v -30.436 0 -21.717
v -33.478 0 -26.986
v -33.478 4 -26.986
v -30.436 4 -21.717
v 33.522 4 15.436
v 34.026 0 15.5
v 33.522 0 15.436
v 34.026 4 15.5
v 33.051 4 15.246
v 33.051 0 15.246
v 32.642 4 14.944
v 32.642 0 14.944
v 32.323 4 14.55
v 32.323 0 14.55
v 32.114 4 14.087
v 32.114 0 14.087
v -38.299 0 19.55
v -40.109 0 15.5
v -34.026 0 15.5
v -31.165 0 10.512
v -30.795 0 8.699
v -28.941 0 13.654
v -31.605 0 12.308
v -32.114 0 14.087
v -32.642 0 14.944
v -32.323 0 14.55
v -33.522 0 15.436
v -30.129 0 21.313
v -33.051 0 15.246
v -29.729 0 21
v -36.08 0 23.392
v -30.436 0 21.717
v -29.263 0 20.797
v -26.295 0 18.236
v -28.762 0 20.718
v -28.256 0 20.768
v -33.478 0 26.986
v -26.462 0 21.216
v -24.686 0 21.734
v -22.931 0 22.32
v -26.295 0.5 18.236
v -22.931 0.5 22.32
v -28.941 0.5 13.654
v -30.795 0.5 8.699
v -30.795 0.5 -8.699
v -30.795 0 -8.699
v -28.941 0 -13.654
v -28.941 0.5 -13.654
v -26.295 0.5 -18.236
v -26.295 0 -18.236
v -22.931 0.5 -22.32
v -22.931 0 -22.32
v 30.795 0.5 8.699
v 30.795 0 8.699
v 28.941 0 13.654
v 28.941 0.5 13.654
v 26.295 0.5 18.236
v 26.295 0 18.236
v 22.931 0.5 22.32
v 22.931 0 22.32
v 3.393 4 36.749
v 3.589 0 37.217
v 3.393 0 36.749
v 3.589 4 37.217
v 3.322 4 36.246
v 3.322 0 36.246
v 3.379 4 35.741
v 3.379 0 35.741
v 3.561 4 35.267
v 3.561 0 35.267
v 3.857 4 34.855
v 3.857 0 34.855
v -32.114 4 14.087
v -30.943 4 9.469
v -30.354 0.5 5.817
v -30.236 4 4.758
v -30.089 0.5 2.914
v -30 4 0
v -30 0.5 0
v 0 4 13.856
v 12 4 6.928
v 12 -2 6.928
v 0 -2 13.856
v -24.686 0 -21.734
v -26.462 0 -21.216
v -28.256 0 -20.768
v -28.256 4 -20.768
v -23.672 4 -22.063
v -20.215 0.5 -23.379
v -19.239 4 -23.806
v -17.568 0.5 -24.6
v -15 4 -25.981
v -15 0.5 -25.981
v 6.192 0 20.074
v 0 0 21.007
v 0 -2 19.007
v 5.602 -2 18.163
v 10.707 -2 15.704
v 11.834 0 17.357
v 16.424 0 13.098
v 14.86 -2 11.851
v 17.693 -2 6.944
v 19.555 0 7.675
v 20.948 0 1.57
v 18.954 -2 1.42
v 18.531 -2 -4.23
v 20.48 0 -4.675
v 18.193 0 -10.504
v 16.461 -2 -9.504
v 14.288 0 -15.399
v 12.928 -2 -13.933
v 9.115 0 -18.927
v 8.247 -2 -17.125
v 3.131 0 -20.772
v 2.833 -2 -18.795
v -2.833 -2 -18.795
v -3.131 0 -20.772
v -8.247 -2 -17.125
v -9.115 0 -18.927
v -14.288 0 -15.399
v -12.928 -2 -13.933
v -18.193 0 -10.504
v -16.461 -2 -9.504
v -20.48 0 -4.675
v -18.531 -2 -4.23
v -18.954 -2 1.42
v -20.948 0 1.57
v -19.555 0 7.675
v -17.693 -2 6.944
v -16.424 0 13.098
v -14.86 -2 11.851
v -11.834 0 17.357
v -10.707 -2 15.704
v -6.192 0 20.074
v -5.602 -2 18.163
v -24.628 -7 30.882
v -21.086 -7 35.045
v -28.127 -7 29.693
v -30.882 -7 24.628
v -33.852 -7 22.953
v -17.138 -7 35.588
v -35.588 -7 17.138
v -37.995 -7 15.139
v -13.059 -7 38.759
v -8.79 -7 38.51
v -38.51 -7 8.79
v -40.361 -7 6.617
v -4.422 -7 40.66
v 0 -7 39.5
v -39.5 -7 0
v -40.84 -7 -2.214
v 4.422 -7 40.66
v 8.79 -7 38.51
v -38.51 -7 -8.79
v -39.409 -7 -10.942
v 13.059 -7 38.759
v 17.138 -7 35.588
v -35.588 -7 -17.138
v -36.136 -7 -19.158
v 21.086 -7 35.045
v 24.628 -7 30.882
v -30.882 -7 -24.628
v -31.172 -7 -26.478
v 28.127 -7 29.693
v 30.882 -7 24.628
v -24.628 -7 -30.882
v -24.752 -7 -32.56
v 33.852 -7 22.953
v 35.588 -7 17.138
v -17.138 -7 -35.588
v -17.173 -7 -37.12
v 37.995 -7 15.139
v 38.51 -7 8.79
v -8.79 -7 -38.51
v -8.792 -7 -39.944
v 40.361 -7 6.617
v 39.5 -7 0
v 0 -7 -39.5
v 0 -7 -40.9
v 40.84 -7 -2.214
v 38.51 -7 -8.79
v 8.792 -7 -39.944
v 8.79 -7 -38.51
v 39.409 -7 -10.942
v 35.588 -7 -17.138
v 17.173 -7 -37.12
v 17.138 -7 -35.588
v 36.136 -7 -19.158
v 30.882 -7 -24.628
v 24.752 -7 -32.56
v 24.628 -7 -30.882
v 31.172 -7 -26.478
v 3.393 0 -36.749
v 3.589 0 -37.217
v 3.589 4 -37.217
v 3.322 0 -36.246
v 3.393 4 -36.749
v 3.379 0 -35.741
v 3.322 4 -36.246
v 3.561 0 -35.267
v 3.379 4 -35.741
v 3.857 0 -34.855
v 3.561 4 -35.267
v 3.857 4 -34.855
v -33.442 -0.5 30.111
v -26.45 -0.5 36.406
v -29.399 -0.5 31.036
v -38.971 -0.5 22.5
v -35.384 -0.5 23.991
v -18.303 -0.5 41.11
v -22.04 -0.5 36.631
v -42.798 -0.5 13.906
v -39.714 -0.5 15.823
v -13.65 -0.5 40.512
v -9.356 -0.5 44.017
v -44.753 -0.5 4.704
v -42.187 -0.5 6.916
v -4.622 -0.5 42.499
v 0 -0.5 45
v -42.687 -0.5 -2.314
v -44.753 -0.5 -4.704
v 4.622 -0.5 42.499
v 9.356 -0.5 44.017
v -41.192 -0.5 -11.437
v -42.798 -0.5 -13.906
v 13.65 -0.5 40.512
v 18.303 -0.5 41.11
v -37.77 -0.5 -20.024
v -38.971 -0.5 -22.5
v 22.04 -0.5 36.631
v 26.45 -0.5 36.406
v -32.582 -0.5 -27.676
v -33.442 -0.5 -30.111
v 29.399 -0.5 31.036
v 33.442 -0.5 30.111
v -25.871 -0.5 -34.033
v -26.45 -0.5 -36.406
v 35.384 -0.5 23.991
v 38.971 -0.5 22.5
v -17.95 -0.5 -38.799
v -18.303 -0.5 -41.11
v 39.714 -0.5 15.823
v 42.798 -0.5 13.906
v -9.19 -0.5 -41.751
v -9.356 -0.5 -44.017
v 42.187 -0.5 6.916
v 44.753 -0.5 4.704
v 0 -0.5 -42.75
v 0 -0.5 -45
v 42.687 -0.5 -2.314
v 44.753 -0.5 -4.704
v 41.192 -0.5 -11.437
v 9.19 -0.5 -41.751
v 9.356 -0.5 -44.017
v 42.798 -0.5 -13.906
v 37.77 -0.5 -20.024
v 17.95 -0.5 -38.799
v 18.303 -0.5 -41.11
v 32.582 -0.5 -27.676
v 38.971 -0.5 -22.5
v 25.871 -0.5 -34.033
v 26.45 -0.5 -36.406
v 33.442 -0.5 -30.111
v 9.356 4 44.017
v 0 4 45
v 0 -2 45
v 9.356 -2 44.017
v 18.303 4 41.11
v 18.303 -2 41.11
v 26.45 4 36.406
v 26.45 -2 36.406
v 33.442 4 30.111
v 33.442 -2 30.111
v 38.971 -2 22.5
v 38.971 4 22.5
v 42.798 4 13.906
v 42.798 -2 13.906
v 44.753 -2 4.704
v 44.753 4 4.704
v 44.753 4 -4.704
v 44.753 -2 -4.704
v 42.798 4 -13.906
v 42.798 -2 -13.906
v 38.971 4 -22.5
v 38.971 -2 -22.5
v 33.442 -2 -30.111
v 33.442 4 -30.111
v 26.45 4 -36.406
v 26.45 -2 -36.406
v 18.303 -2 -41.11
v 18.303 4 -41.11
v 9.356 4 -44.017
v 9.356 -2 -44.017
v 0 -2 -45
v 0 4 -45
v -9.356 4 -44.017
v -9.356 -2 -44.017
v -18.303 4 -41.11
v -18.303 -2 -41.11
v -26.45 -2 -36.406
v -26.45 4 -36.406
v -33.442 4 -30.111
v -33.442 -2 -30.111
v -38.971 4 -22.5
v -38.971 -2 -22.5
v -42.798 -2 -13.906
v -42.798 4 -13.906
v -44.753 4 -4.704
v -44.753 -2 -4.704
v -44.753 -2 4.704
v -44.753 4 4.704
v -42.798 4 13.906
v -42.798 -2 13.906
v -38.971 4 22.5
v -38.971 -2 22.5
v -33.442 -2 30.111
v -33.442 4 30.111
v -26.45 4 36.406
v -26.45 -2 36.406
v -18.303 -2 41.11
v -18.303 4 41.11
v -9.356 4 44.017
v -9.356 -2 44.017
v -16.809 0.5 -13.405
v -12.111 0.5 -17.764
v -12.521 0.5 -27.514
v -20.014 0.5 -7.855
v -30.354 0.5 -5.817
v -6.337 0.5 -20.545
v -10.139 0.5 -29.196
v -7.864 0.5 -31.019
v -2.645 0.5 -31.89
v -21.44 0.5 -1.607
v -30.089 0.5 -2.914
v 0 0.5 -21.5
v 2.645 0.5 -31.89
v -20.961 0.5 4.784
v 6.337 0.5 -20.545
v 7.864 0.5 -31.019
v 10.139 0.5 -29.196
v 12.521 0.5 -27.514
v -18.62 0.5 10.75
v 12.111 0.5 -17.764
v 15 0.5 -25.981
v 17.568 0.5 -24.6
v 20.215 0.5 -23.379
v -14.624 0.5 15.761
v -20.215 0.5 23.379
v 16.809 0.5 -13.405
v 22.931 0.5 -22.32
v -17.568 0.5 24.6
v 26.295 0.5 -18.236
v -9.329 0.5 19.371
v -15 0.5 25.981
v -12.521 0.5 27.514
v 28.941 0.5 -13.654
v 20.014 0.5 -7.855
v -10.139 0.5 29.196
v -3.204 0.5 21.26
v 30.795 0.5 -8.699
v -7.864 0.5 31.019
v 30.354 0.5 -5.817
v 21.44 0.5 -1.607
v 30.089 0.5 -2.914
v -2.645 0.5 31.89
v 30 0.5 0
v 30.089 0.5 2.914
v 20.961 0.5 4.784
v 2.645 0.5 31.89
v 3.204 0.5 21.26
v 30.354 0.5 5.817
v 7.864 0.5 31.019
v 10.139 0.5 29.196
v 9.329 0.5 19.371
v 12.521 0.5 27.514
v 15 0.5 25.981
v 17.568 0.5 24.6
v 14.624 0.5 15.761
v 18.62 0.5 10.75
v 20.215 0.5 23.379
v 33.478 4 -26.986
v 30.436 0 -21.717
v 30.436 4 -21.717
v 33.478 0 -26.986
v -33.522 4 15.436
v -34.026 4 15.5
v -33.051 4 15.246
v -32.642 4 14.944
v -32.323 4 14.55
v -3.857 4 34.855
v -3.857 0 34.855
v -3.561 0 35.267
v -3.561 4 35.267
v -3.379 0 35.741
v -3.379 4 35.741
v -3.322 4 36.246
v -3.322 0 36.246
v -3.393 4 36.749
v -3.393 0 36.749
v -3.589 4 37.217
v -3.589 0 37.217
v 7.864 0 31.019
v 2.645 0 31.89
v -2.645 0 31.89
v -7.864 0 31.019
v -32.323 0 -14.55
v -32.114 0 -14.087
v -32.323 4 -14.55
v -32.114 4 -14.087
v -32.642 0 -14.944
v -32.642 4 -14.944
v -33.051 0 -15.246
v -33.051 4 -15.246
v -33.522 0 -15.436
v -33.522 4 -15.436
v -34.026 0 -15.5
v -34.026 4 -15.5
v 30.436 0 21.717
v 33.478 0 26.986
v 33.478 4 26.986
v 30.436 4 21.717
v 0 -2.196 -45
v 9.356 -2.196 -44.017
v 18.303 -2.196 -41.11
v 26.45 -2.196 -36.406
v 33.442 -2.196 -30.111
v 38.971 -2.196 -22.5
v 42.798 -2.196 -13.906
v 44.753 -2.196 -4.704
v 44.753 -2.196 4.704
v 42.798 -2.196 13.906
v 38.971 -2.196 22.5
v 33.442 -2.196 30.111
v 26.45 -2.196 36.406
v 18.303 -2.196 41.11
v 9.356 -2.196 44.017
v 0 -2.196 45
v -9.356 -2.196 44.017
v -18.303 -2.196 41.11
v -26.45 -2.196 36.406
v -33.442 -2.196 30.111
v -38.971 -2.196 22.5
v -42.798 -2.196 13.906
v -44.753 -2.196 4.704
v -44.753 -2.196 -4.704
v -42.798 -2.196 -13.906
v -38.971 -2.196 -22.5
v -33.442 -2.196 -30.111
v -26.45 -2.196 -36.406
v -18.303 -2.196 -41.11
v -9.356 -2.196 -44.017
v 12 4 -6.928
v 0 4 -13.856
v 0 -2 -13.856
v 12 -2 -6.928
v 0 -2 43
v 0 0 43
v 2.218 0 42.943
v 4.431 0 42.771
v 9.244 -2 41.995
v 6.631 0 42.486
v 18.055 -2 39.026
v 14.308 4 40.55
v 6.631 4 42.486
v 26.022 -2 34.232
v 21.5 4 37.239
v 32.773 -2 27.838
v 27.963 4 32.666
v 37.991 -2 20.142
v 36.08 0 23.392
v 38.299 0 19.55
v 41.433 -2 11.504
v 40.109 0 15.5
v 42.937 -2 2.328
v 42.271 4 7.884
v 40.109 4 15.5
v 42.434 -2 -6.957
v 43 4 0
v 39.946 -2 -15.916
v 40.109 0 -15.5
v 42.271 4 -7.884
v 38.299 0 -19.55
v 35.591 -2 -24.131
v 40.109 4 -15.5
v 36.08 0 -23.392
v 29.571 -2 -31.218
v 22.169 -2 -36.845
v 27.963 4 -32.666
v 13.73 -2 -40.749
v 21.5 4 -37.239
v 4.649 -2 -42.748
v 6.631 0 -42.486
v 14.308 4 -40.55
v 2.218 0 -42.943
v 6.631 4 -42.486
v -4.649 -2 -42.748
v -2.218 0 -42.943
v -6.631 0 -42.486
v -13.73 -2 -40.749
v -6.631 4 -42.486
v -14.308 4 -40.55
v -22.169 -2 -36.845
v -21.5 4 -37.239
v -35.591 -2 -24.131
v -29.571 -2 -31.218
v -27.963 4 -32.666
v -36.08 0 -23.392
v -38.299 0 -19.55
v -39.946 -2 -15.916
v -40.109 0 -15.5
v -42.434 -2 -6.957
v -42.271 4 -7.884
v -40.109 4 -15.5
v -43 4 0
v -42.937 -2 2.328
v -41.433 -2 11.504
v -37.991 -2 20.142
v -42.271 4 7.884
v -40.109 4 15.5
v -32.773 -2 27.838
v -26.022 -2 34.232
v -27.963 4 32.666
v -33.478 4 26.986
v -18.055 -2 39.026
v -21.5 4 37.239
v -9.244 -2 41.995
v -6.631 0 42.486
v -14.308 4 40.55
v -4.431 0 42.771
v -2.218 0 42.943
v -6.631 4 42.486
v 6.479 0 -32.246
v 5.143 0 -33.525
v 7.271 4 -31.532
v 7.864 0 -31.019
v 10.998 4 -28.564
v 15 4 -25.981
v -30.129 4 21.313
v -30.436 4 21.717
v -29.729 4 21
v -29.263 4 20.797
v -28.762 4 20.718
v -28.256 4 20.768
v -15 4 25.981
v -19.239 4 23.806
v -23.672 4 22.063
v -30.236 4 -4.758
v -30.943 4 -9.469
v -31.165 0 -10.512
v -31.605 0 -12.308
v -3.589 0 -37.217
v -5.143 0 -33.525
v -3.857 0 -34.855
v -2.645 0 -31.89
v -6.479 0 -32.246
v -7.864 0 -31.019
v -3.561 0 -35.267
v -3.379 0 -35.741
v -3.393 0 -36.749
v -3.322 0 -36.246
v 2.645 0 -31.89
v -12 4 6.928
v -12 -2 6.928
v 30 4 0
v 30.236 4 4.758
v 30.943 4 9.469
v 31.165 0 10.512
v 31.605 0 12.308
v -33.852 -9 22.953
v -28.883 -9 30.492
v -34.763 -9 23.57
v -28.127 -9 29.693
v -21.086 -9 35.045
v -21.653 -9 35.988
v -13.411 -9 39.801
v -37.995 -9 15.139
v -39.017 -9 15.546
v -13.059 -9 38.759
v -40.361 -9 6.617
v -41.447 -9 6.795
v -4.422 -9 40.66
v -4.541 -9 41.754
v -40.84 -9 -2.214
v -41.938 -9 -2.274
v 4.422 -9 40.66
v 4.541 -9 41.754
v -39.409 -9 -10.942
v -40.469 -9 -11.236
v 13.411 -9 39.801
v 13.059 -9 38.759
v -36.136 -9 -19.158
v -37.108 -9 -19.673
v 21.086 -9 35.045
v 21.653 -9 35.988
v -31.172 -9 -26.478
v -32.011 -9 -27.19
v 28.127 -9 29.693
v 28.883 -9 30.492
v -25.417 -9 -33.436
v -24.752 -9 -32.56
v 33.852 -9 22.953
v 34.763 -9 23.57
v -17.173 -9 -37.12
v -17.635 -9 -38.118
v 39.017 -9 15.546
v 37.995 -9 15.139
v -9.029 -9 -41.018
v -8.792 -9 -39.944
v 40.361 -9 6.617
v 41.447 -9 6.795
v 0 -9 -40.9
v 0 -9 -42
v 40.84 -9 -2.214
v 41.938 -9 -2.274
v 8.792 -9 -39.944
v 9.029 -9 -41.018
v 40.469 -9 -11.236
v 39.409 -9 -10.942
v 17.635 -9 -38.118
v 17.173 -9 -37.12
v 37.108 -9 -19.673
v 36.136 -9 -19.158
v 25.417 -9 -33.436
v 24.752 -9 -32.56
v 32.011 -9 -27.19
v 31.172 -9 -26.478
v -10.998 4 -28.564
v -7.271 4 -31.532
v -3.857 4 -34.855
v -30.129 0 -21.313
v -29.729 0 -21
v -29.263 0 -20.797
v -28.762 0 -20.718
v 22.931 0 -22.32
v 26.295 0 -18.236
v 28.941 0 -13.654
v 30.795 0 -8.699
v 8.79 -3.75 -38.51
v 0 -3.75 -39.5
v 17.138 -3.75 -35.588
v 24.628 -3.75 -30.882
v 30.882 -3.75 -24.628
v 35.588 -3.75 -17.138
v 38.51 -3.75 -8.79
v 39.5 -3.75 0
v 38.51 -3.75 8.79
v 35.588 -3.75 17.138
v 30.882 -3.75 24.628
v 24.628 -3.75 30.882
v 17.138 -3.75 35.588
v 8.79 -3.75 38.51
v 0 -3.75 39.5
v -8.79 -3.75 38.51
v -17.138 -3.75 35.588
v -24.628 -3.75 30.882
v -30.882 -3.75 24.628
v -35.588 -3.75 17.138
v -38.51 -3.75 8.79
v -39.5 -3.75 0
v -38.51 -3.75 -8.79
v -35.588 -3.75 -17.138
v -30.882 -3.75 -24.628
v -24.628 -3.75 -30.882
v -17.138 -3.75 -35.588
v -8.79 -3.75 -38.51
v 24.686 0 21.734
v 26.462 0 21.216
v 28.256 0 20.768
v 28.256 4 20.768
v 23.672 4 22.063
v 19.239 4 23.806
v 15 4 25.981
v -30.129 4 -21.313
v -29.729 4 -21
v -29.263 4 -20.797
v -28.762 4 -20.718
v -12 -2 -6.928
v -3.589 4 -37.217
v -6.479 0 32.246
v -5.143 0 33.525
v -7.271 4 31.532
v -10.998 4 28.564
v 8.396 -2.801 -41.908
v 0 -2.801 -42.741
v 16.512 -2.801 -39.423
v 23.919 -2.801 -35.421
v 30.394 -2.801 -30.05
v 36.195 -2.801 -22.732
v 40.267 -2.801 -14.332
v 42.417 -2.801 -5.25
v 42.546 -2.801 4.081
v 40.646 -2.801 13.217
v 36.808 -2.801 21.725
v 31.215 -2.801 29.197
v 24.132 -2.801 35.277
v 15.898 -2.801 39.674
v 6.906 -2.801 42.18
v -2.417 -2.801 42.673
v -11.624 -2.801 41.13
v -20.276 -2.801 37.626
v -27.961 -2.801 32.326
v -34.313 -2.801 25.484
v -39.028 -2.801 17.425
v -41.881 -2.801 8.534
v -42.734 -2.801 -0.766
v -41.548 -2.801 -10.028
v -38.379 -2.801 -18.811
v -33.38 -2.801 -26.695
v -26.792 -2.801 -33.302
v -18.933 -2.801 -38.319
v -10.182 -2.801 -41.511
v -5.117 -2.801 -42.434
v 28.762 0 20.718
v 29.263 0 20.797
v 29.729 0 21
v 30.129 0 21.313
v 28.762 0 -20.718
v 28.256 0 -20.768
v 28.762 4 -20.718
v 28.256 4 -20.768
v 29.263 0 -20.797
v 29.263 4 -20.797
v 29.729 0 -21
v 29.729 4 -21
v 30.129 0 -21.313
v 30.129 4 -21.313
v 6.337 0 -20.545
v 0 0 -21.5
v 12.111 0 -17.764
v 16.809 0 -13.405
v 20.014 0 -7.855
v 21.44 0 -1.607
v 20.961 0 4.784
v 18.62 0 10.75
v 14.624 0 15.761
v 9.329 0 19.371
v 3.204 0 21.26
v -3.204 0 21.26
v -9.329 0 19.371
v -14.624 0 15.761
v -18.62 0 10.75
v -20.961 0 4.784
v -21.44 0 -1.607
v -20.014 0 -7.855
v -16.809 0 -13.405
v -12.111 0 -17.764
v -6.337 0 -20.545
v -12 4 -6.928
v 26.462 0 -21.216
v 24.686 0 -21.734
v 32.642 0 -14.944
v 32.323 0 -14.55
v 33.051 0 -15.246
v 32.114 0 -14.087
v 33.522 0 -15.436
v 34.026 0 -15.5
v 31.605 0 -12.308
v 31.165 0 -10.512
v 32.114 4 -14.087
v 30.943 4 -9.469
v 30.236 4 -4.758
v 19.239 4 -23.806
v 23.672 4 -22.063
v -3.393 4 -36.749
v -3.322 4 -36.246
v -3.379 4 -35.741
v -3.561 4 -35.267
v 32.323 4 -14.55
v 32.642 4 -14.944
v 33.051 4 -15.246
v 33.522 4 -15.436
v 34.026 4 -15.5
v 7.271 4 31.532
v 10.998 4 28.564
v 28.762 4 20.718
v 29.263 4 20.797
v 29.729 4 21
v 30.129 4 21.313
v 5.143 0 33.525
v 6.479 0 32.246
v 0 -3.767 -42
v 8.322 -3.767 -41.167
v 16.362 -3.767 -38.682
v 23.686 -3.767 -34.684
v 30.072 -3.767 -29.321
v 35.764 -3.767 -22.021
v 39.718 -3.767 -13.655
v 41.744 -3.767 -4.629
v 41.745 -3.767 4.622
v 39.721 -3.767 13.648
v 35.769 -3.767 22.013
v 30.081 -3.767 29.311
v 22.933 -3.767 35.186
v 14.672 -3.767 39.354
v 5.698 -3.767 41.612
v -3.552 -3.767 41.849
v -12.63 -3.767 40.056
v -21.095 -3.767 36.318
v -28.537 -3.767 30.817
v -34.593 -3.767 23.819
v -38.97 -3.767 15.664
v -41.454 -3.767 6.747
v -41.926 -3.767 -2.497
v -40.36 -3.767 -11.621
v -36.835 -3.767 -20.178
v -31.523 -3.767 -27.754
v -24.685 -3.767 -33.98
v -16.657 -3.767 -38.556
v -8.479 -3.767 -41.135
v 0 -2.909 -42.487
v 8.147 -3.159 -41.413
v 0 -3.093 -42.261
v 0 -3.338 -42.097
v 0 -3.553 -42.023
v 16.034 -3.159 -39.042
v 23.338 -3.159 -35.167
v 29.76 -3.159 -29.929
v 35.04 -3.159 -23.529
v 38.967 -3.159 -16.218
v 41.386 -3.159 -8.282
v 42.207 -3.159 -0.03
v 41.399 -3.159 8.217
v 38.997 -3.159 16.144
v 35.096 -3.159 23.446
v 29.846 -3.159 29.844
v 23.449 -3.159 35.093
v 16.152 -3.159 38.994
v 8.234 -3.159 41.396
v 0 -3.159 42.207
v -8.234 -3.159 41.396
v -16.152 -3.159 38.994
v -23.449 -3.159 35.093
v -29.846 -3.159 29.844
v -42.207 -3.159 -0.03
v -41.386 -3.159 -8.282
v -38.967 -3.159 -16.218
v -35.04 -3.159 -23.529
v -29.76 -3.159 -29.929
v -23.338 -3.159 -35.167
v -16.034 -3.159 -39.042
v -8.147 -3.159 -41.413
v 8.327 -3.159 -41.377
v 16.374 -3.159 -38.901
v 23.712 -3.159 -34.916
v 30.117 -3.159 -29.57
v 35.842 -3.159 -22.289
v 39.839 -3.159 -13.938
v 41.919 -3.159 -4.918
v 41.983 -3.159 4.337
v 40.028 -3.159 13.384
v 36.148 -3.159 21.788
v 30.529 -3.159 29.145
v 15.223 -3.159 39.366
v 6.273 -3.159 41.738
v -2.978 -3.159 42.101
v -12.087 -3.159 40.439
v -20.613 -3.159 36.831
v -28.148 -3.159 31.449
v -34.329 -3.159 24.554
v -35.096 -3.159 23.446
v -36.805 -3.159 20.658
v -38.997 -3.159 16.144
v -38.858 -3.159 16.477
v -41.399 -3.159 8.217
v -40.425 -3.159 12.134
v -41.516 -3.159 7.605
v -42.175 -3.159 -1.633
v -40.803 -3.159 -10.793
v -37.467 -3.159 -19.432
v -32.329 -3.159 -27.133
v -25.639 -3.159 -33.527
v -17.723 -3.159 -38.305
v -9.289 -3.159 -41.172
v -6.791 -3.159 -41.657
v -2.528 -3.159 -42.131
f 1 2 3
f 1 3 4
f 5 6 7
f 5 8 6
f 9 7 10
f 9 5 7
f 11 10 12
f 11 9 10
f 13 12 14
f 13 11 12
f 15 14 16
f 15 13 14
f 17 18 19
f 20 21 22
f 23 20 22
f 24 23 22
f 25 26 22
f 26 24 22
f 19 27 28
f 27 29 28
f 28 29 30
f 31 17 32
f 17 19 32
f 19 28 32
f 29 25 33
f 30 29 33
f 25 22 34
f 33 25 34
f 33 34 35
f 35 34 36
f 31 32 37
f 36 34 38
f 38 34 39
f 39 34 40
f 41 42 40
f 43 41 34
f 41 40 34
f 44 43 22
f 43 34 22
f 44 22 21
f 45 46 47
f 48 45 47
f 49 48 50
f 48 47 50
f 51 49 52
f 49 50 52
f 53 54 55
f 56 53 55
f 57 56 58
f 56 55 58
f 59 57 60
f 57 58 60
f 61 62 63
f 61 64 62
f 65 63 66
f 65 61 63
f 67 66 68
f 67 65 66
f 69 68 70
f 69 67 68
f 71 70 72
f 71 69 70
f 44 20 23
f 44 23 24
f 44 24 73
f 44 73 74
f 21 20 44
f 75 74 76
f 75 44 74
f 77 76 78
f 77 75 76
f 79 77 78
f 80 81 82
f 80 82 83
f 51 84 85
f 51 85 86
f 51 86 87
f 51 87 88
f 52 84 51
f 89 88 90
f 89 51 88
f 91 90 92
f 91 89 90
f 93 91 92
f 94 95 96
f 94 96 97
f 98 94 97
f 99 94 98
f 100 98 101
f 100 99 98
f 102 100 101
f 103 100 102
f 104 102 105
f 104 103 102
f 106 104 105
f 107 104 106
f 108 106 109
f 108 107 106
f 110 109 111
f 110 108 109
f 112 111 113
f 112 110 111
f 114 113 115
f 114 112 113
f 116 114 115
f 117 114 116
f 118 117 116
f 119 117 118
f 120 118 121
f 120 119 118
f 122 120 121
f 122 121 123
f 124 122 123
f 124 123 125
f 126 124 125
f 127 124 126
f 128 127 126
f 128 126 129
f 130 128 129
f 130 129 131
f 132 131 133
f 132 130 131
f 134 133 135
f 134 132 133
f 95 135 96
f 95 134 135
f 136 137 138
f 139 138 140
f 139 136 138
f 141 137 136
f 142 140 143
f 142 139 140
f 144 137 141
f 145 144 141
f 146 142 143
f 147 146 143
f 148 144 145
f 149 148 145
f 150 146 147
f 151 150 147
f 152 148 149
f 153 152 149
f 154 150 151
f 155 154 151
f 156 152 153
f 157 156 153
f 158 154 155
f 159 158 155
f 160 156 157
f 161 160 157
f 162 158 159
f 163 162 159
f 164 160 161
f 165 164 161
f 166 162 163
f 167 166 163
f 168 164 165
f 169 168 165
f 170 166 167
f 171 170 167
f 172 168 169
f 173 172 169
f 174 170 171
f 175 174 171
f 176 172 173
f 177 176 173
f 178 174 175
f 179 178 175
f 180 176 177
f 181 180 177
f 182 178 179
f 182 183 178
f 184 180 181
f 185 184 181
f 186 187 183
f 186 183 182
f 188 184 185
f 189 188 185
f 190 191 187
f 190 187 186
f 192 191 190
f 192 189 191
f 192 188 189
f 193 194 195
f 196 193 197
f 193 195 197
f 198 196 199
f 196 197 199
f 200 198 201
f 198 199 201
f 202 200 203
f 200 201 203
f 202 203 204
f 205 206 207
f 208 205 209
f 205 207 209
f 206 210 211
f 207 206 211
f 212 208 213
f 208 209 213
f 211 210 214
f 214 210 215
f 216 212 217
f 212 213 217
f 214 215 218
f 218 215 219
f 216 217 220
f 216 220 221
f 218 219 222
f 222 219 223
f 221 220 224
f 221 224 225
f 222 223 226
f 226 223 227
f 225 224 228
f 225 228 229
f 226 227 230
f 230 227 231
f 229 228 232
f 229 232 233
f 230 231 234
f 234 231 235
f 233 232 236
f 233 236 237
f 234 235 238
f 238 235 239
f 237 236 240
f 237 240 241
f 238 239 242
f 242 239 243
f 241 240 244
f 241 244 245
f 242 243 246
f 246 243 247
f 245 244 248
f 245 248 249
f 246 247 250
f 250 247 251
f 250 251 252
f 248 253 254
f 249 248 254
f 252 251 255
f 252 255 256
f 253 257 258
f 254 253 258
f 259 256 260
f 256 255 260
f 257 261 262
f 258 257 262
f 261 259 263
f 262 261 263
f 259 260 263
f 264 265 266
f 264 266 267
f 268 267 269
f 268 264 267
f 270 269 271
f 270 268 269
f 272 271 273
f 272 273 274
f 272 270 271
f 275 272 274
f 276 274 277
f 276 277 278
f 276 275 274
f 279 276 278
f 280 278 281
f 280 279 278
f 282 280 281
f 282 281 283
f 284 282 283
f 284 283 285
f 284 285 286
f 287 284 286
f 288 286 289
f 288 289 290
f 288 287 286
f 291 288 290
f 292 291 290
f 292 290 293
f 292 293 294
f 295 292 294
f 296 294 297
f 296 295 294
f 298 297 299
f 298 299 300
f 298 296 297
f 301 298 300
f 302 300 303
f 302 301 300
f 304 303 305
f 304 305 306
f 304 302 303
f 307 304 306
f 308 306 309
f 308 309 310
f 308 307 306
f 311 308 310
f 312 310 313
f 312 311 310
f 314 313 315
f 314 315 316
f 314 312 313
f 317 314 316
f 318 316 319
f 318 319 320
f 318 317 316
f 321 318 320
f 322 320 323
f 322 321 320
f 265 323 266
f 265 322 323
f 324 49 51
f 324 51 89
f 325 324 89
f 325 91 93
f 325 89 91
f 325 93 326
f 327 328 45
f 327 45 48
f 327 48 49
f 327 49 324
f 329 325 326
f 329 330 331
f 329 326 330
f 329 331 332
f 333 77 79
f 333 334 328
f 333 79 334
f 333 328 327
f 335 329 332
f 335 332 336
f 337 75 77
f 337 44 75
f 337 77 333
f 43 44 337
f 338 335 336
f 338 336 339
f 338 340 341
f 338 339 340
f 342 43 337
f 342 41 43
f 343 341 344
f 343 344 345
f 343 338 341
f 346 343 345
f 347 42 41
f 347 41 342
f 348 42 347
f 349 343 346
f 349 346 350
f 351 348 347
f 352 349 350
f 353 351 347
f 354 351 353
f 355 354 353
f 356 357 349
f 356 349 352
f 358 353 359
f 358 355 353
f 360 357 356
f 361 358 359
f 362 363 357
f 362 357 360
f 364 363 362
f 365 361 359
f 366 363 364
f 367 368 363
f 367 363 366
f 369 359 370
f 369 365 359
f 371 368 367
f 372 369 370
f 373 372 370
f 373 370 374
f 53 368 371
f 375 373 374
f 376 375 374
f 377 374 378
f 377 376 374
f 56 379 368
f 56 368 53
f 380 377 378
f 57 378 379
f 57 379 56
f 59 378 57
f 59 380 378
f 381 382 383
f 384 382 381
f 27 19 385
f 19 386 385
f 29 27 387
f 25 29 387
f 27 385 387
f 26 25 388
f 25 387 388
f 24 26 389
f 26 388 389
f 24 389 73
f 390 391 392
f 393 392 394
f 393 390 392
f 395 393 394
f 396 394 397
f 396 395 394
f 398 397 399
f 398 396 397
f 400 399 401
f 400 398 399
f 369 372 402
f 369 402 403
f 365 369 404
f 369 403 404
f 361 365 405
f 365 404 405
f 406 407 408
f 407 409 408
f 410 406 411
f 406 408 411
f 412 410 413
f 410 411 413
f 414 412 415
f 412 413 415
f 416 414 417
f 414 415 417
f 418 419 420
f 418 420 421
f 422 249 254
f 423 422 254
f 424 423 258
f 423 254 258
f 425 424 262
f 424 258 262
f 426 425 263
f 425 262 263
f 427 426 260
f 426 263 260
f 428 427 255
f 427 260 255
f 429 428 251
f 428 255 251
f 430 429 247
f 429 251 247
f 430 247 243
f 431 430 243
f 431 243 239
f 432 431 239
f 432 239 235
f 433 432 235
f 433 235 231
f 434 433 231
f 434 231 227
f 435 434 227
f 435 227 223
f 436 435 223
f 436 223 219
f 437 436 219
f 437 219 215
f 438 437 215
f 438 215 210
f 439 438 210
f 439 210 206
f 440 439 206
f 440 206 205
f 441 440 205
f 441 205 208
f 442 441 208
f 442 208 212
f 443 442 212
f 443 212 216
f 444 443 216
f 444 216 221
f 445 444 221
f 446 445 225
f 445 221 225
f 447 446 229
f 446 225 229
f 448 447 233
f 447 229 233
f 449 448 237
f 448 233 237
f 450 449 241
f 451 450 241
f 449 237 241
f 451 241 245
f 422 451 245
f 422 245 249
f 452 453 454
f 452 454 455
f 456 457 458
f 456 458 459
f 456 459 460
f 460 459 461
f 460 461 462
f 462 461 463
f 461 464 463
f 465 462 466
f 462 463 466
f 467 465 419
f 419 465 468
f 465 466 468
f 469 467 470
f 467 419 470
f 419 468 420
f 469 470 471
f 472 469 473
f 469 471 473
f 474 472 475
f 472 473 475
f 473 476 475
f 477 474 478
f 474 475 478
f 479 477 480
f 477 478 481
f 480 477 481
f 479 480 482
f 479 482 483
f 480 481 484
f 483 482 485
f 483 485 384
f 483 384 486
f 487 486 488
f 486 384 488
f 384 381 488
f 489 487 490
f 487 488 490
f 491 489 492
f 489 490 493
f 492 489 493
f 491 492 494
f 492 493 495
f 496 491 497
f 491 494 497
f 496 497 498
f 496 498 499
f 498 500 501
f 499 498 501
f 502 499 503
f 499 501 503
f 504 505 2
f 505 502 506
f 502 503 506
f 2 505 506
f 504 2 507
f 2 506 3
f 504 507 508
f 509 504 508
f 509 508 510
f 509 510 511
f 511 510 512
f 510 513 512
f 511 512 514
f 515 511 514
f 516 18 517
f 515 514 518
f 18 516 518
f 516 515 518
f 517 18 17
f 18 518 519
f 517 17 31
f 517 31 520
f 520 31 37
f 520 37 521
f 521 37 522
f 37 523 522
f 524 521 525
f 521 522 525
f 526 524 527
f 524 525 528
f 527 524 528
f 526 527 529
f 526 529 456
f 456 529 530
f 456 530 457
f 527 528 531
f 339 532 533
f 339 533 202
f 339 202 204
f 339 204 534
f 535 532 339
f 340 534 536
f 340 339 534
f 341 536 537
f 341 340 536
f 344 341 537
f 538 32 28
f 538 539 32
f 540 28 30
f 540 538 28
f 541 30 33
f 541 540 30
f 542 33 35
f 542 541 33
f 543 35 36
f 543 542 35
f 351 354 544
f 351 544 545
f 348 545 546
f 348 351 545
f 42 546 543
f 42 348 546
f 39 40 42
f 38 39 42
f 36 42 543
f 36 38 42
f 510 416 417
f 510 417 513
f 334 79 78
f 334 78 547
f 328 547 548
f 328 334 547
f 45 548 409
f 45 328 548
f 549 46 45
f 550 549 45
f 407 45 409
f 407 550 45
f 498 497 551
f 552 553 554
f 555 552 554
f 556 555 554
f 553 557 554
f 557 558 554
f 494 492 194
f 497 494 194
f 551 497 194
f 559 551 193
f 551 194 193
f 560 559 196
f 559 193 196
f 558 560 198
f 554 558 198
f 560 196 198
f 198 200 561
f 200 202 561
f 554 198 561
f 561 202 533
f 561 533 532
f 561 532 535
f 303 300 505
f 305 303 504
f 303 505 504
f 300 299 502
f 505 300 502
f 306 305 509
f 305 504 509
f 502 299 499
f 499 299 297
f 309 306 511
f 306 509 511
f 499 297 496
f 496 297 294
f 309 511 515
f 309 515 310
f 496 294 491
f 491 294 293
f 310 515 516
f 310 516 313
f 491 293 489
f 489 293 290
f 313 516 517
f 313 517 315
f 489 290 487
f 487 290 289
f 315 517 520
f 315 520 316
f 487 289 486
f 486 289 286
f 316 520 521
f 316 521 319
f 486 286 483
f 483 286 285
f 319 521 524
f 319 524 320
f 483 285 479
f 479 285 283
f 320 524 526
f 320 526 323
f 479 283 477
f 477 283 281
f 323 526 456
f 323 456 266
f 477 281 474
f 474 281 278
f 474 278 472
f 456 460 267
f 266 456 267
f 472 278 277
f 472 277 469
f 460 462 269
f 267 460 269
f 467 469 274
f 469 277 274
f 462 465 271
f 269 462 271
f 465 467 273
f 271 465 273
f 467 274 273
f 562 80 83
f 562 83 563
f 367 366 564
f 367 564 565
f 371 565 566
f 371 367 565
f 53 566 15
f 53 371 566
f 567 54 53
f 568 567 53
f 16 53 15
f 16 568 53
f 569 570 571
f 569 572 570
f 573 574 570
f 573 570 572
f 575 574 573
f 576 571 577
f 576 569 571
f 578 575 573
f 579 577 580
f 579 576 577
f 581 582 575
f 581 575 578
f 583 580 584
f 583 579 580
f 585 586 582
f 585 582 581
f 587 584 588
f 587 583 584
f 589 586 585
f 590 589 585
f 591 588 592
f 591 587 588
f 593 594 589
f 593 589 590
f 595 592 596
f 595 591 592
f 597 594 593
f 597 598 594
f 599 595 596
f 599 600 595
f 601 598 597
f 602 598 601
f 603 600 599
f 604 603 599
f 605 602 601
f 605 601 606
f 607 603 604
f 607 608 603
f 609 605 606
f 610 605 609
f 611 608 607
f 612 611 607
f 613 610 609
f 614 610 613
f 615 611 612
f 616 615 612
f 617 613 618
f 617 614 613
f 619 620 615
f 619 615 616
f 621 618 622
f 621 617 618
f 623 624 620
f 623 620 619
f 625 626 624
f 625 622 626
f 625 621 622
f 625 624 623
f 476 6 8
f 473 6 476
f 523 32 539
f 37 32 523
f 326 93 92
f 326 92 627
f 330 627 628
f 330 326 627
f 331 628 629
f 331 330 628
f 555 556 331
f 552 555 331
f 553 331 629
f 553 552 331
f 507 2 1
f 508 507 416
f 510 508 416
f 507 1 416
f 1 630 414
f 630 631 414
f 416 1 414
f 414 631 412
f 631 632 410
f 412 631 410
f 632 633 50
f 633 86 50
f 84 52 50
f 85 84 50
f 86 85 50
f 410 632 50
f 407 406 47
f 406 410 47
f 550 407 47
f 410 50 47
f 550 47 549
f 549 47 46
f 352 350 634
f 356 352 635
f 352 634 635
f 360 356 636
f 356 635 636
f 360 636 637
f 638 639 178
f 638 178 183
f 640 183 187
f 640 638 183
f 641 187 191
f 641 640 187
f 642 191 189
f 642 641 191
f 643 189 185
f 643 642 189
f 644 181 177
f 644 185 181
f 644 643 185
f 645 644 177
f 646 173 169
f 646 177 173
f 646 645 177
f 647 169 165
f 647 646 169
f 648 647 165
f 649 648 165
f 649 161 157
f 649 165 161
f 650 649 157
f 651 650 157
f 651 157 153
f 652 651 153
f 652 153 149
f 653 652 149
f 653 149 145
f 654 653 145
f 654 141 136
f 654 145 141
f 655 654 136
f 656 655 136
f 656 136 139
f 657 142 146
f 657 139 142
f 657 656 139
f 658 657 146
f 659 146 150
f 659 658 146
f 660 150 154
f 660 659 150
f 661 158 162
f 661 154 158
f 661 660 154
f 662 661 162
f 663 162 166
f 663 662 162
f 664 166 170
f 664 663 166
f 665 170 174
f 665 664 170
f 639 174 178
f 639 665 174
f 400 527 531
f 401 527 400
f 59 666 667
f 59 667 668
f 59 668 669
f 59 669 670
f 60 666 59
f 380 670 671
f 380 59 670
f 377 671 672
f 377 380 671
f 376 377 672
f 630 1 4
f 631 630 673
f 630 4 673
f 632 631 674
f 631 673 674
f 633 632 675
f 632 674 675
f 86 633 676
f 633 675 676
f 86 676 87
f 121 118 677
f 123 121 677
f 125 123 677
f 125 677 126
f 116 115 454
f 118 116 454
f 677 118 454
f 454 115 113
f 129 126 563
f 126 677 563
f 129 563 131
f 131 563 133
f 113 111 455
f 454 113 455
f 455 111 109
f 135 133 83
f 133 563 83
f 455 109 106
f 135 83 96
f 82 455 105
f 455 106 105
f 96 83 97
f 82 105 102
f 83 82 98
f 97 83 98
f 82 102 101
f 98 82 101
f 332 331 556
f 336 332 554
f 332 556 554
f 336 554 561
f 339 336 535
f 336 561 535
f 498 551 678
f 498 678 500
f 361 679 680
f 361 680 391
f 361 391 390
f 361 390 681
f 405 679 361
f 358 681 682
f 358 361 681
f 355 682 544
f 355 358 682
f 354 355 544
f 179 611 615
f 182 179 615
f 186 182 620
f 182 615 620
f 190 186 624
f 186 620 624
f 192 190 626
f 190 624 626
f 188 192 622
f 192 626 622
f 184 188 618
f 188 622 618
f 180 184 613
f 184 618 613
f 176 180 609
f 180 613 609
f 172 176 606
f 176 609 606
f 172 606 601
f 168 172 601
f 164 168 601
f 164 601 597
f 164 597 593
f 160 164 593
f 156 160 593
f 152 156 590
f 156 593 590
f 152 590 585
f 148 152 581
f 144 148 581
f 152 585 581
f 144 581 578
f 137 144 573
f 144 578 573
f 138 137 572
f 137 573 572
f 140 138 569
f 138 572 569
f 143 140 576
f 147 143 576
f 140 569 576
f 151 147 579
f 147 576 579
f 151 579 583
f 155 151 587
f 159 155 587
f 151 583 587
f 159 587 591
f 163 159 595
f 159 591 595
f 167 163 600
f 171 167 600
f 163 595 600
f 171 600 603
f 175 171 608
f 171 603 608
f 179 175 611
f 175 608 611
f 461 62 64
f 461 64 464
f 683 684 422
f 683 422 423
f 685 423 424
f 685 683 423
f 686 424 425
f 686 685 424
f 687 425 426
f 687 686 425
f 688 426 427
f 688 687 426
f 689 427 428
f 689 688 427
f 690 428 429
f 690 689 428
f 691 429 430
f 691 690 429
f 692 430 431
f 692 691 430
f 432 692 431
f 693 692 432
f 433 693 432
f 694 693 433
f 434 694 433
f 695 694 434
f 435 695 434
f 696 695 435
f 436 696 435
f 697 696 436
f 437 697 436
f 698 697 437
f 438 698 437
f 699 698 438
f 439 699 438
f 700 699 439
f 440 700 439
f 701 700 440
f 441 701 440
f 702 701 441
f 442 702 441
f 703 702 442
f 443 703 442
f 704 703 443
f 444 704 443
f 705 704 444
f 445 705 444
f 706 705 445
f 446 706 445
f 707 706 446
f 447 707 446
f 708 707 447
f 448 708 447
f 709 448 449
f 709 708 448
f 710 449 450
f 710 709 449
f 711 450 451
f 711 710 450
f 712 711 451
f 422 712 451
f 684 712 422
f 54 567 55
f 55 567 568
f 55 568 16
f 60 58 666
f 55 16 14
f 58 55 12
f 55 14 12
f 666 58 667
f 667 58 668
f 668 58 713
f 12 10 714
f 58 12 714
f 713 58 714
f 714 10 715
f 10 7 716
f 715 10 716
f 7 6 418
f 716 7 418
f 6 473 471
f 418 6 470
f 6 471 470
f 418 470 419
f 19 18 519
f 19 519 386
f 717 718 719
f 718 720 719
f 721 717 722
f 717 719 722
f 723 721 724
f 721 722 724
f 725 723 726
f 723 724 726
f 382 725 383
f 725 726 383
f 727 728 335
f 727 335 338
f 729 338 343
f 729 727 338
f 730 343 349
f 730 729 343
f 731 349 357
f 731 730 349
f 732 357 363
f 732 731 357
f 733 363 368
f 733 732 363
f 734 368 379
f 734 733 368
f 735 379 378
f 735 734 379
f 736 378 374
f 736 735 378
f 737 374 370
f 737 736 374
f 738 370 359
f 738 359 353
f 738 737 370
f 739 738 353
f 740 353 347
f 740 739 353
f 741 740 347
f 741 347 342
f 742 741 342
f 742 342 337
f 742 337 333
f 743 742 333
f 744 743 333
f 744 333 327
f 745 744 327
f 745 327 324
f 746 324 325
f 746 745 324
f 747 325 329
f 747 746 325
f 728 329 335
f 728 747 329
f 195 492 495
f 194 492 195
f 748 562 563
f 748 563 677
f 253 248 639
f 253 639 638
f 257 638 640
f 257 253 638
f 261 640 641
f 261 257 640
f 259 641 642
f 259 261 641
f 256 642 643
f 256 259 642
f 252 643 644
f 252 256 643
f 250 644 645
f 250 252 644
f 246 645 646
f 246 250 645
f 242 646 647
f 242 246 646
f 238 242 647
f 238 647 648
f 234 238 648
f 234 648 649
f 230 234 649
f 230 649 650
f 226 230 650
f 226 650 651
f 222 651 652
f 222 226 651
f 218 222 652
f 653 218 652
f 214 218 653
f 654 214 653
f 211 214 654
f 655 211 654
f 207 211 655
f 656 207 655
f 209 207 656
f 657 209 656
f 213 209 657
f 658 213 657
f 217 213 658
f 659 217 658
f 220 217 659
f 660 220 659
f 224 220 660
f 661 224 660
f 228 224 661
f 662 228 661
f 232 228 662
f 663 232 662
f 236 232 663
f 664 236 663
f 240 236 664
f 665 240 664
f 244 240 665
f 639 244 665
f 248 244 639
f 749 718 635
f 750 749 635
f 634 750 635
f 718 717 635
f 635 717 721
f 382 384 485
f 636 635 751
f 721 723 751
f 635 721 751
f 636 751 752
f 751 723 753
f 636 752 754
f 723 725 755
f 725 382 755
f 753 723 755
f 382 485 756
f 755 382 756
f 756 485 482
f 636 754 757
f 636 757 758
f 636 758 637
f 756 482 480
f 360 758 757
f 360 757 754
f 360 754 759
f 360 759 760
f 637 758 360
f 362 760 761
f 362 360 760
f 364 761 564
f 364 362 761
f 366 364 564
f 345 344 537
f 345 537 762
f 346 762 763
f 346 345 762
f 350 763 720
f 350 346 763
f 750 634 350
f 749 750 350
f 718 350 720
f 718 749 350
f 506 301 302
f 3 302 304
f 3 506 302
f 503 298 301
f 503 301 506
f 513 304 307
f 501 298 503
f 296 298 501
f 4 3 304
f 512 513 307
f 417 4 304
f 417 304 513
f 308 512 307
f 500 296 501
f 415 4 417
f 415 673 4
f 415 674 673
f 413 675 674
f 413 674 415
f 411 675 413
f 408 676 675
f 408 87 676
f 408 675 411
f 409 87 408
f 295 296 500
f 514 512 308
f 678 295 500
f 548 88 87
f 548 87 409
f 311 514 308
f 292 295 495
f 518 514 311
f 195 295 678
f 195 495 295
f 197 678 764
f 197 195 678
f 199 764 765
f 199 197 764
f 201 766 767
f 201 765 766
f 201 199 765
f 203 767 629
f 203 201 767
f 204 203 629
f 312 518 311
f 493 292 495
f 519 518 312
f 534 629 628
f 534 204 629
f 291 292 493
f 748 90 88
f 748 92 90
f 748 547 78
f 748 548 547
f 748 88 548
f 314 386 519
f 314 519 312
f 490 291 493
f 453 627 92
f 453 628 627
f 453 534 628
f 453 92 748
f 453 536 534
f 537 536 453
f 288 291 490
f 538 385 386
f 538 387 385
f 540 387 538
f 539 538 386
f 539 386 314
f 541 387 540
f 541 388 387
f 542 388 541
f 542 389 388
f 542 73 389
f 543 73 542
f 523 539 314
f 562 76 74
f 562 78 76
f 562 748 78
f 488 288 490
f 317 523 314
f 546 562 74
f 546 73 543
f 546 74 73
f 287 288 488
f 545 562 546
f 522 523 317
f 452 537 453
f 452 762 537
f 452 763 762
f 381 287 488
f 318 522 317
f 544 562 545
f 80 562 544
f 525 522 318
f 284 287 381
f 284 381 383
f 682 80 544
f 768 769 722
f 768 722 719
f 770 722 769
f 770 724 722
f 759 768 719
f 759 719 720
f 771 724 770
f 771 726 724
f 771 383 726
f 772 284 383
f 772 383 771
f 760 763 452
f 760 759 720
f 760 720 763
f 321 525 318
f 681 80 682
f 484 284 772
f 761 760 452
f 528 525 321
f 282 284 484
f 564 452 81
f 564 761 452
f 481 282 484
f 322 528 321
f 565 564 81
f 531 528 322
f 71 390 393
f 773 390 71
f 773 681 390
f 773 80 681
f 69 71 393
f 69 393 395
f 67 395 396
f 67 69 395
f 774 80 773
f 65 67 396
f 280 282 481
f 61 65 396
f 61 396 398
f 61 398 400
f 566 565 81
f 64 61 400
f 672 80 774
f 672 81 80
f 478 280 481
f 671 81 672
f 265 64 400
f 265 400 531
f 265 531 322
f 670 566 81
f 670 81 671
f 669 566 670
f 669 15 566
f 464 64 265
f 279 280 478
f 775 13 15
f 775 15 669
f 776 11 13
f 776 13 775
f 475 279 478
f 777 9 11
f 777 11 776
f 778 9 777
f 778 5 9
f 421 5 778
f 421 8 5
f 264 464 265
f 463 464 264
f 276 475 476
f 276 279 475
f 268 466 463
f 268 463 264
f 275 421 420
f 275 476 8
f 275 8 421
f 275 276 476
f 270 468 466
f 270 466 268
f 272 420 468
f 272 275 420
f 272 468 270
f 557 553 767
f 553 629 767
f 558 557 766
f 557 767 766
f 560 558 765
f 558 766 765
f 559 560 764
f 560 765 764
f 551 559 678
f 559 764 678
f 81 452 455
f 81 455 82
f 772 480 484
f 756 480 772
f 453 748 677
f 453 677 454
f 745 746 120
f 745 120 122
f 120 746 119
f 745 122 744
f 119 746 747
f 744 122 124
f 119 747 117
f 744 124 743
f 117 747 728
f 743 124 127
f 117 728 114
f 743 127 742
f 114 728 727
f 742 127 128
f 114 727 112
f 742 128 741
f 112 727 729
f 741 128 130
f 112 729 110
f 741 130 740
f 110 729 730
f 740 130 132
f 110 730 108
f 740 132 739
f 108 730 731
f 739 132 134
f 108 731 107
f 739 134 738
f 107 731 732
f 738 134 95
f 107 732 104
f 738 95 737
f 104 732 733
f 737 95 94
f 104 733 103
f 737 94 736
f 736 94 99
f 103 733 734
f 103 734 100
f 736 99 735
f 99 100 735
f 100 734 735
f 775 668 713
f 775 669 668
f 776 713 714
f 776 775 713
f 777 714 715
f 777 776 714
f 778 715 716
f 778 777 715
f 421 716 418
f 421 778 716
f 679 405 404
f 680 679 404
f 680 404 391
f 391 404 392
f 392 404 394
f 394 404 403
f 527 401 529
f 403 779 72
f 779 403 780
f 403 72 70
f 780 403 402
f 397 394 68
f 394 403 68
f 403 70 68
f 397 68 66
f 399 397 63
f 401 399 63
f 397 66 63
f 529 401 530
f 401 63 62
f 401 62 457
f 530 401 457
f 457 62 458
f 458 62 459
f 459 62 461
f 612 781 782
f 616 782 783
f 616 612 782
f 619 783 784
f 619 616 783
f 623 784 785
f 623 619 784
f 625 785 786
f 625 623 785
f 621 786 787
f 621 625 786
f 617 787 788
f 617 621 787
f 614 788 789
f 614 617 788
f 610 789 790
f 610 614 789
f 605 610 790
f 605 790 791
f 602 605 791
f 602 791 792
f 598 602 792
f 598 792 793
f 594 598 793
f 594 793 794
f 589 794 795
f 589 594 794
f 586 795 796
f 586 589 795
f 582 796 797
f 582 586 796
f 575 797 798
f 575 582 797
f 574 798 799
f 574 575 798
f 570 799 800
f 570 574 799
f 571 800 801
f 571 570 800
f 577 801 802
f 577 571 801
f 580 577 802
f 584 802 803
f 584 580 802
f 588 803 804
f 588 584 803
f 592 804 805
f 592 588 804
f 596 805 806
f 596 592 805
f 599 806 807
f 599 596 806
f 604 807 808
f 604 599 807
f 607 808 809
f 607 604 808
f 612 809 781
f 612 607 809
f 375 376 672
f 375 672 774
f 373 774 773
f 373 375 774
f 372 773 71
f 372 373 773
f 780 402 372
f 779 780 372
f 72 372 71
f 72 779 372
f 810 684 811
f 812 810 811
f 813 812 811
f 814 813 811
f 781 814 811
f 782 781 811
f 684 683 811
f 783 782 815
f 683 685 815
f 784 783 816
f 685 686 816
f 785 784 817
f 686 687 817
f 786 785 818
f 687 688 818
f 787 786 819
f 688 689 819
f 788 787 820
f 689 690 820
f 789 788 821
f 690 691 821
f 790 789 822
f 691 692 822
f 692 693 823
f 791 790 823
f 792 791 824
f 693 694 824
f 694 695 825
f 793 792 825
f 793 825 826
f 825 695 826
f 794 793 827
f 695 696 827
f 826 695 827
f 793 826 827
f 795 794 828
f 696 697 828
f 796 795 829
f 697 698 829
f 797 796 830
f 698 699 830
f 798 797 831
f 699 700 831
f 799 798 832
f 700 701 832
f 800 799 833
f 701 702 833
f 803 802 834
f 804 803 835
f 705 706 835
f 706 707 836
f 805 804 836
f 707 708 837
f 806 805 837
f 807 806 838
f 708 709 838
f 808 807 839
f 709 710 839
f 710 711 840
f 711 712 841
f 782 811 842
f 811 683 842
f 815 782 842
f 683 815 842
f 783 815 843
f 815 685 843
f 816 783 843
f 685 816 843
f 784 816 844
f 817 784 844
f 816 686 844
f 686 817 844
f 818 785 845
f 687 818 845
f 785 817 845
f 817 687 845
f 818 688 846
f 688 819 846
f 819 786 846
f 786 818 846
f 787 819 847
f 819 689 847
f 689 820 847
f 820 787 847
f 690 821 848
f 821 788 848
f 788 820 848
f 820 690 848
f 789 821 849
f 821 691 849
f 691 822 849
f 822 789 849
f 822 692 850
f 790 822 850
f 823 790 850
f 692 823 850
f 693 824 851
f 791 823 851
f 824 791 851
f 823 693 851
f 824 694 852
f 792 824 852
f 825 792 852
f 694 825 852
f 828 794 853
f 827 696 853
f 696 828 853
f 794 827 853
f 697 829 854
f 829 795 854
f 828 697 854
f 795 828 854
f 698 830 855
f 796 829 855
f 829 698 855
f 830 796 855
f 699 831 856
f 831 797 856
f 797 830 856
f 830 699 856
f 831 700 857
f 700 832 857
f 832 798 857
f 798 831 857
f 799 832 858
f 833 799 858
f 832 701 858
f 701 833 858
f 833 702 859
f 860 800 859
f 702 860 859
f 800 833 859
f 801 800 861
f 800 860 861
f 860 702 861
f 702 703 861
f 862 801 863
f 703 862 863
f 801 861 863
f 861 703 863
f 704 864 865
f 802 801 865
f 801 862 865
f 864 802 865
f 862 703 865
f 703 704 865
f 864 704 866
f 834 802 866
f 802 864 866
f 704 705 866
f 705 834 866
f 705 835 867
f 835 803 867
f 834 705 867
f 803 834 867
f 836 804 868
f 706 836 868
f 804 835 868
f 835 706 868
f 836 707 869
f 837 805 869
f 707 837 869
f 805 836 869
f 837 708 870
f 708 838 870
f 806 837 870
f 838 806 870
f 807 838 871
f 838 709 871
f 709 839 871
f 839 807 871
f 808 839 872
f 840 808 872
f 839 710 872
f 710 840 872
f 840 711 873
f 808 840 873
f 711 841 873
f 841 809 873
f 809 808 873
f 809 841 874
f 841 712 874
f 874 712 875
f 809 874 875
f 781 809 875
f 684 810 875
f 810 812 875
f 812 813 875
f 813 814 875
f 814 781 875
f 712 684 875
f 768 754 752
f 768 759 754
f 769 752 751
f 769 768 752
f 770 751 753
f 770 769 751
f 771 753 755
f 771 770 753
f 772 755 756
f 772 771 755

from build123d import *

# Parameters (mm, degrees)
SKIZZE1_R                            = 44
AUFSATZ_LINEAR_AUSTRAGEN1_DEPTH      = 4
SCHNITT_LINEAR_START                 = -10
SCHNITT_LINEAR_AUSTRAGEN2_DEPTH      = 10
SKIZZE4_R                            = 21.007106764
AUFSATZ_LINEAR_AUSTRAGEN4_DEPTH      = 6
KREISMUSTER1_COUNT                   = 6
SCHNITT_LINEAR_AUSTRAGEN3_DEPTH      = 4
SCHNITT_LINEAR_AUSTRAGEN3_DEPTH_BACK = 10
VERRUNDUNG1_R                        = 2
SKIZZE8_R                            = 45
SKIZZE8_R_2                          = 43
AUFSATZ_LINEAR_AUSTRAGEN2_DEPTH      = 6
AUFSATZ_LINEAR_AUSTRAGEN3_DEPTH      = 7
AUFSATZ_LINEAR_AUSTRAGEN3_DEPTH_BACK = 1.5
SKIZZE9_R                            = 45
SKIZZE9_R_2                          = 39.5
FASE1_SIZE                           = 3.25
SKIZZE7_R                            = 32
SKIZZE7_R_2                          = 21.5
SCHNITT_LINEAR_AUSTRAGEN7_DEPTH      = 0.5
SKIZZE10_R                           = 50
SKIZZE10_R_2                         = 42
SCHNITT_LINEAR_AUSTRAGEN9_DEPTH      = 6
SKIZZE11_R                           = 40.9
SKIZZE11_R_2                         = 30
SCHNITT_LINEAR_AUSTRAGEN10_DEPTH     = 2
FASE2_SIZE                           = 0.803847577
FASE2_SIZE_2                         = 3
FASE3_SIZE                           = 2
VERRUNDUNG2_R                        = 1


# Some blends are built 0.0001 mm under size
with BuildPart() as part:
    # Skizze1 → Aufsatz-Linear austragen1 (new body)
    with BuildSketch(Plane(origin=(0, 0, 0), x_dir=(1, 0, 0), z_dir=(0, 1, 0))):
        with Locations(Location((0, 0, 0), (0, 0, 270))):
            Circle(SKIZZE1_R)
    extrude(amount=AUFSATZ_LINEAR_AUSTRAGEN1_DEPTH)

    # Skizze2 → Schnitt-Linear austragen2 (cut)
    with BuildSketch(Plane(origin=(0, 4, 0), x_dir=(1, 0, 0), z_dir=(0, 1, 0)).offset(SCHNITT_LINEAR_START)):
        with BuildLine():
            ThreePointArc((-30, 0), (-30.647234858, 7.855929826), (-32.571484726, 15.5))
            Line((-32.571484726, 15.5), (-41.179485184, 15.5))
            ThreePointArc((-41.179485184, 15.5), (-44, 0), (-41.179485184, -15.5))
            Line((-41.179485184, -15.5), (-32.571484726, -15.5))
            ThreePointArc((-32.571484726, -15.5), (-30.647234858, -7.855929826), (-30, 0))
        make_face()
    schnitt_linear_austragen2 = extrude(amount=SCHNITT_LINEAR_AUSTRAGEN2_DEPTH, mode=Mode.SUBTRACT)

    # Skizze4 → Aufsatz-Linear austragen4 (add)
    with BuildSketch(Plane(origin=(0, 4, 0), x_dir=(1, 0, 0), z_dir=(0, 1, 0))):
        with Locations(Location((0, 0, 0), (0, 0, 270))):
            Circle(SKIZZE4_R)
    extrude(amount=-AUFSATZ_LINEAR_AUSTRAGEN4_DEPTH)

    # Kreismuster1: Schnitt-Linear austragen2 ×6 about axis
    kreismuster1_axis = Axis((0, 0, 0), (0, 1, 0))
    for i in range(1, KREISMUSTER1_COUNT):
        add(schnitt_linear_austragen2.rotate(kreismuster1_axis, i * 360 / KREISMUSTER1_COUNT), mode=Mode.SUBTRACT)

    # Skizze3 → Schnitt-Linear austragen3 (cut, two sides: drawn at the far end of the back side and taken through both)
    with BuildSketch(Plane.XZ.offset(-SCHNITT_LINEAR_AUSTRAGEN3_DEPTH_BACK)):
        Polygon((12, 6.92820323), (0, 13.856406461), (-12, 6.92820323), (-12, -6.92820323), (0, -13.856406461), (12, -6.92820323), align=None)
    extrude(amount=SCHNITT_LINEAR_AUSTRAGEN3_DEPTH + SCHNITT_LINEAR_AUSTRAGEN3_DEPTH_BACK, mode=Mode.SUBTRACT)

    # Verrundung1
    verrundung1_edges = [part.edges().sort_by_distance(p)[0] for p in [
        (-32.571484726, 2, 15.5),
        (-32.571484726, 2, -15.5),
        (-29.709136122, 2, -20.457733212),
        (-2.862348604, 2, -35.957733212),
        (2.862348604, 2, -35.957733212),
        (29.709136122, 2, -20.457733212),
        (32.571484726, 2, -15.5),
        (32.571484726, 2, 15.5),
        (29.709136122, 2, 20.457733212),
        (2.862348604, 2, 35.957733212),
        (-2.862348604, 2, 35.957733212),
        (-29.709136122, 2, 20.457733212),
    ]]
    fillet(verrundung1_edges, radius=VERRUNDUNG1_R)

    # Skizze8 → Aufsatz-Linear austragen2 (add)
    with BuildSketch(Plane(origin=(0, 4, 0), x_dir=(1, 0, 0), z_dir=(0, 1, 0))):
        with Locations(Location((0, 0, 0), (0, 0, 270))):
            Circle(SKIZZE8_R)
        with Locations(Location((0, 0, 0), (0, 0, 270))):
            Circle(SKIZZE8_R_2, mode=Mode.SUBTRACT)
    extrude(amount=-AUFSATZ_LINEAR_AUSTRAGEN2_DEPTH)

    # Skizze7 → Schnitt-Linear austragen7 (cut)
    with BuildSketch(Plane.XZ):
        Circle(SKIZZE7_R)
        with Locations(Location((0, 0, 0), (0, 0, 270))):
            Circle(SKIZZE7_R_2, mode=Mode.SUBTRACT)
    extrude(amount=-SCHNITT_LINEAR_AUSTRAGEN7_DEPTH, mode=Mode.SUBTRACT)

    # Fase3
    fase3_edges = [part.edges().sort_by_distance(p)[0] for p in [
        (0, -2, -21.007106764),
    ]]
    chamfer(fase3_edges, length=FASE3_SIZE - 0.0001)  # a hair under: the kernel refuses the full size


with BuildPart() as body_2:
    # Skizze9 → Aufsatz-Linear austragen3 (new, two sides: drawn at the far end of the back side and taken through both)
    with BuildSketch(Plane.XZ.offset(2).offset(-AUFSATZ_LINEAR_AUSTRAGEN3_DEPTH_BACK)):
        with Locations(Location((0, 0, 0), (0, 0, 270))):
            Circle(SKIZZE9_R)
        with Locations(Location((0, 0, 0), (0, 0, 270))):
            Circle(SKIZZE9_R_2, mode=Mode.SUBTRACT)
    extrude(amount=AUFSATZ_LINEAR_AUSTRAGEN3_DEPTH + AUFSATZ_LINEAR_AUSTRAGEN3_DEPTH_BACK)

    # Fase1
    fase1_edges = [body_2.edges().sort_by_distance(p)[0] for p in [
        (0, -0.5, 39.5),
    ]]
    chamfer(fase1_edges, length=FASE1_SIZE)

    # Skizze10 → Schnitt-Linear austragen9 (cut)
    with BuildSketch(Plane.XZ.offset(9)):
        Circle(SKIZZE10_R)
        with Locations(Location((0, 0, 0), (0, 0, 270))):
            Circle(SKIZZE10_R_2, mode=Mode.SUBTRACT)
    extrude(amount=-SCHNITT_LINEAR_AUSTRAGEN9_DEPTH, mode=Mode.SUBTRACT)

    # Skizze11 → Schnitt-Linear austragen10 (cut)
    with BuildSketch(Plane.XZ.offset(9)):
        with Locations(Location((0, 0, 0), (0, 0, 270))):
            Circle(SKIZZE11_R)
        with Locations((-1.948563864, 1.772578218)):
            Circle(SKIZZE11_R_2, mode=Mode.SUBTRACT)
    extrude(amount=-SCHNITT_LINEAR_AUSTRAGEN10_DEPTH, mode=Mode.SUBTRACT)

    # Fase2
    # the kernel refuses this chamfer: 3, 0.803847577 mm, written as the material it takes off along each edge
    with BuildSketch(Plane(origin=(0, -3, 0), x_dir=(0, 0, -1), z_dir=(-1, 0, 0))) as fase2_piece_1_section:
        Polygon((45, -FASE2_SIZE), (45 - FASE2_SIZE_2, 0), (45, 0), align=None)
    fase2_piece_1 = revolve(axis=Axis((0, -3, 0), (0, -1, 0)), mode=Mode.PRIVATE)
    fase2_piece_1 = fase2_piece_1 - Plane(origin=(0, -2.653988874, 0), x_dir=(0, 0, -1), z_dir=(0, -1, 0)) * Cylinder(42, 180, mode=Mode.PRIVATE)
    add(fase2_piece_1, mode=Mode.SUBTRACT)

    # Verrundung2
    verrundung2_edges = [body_2.edges().sort_by_distance(p)[0] for p in [
        (0, -3, 42),
    ]]
    fillet(verrundung2_edges, radius=VERRUNDUNG2_R)


solid = Compound([part.part, body_2.part])
